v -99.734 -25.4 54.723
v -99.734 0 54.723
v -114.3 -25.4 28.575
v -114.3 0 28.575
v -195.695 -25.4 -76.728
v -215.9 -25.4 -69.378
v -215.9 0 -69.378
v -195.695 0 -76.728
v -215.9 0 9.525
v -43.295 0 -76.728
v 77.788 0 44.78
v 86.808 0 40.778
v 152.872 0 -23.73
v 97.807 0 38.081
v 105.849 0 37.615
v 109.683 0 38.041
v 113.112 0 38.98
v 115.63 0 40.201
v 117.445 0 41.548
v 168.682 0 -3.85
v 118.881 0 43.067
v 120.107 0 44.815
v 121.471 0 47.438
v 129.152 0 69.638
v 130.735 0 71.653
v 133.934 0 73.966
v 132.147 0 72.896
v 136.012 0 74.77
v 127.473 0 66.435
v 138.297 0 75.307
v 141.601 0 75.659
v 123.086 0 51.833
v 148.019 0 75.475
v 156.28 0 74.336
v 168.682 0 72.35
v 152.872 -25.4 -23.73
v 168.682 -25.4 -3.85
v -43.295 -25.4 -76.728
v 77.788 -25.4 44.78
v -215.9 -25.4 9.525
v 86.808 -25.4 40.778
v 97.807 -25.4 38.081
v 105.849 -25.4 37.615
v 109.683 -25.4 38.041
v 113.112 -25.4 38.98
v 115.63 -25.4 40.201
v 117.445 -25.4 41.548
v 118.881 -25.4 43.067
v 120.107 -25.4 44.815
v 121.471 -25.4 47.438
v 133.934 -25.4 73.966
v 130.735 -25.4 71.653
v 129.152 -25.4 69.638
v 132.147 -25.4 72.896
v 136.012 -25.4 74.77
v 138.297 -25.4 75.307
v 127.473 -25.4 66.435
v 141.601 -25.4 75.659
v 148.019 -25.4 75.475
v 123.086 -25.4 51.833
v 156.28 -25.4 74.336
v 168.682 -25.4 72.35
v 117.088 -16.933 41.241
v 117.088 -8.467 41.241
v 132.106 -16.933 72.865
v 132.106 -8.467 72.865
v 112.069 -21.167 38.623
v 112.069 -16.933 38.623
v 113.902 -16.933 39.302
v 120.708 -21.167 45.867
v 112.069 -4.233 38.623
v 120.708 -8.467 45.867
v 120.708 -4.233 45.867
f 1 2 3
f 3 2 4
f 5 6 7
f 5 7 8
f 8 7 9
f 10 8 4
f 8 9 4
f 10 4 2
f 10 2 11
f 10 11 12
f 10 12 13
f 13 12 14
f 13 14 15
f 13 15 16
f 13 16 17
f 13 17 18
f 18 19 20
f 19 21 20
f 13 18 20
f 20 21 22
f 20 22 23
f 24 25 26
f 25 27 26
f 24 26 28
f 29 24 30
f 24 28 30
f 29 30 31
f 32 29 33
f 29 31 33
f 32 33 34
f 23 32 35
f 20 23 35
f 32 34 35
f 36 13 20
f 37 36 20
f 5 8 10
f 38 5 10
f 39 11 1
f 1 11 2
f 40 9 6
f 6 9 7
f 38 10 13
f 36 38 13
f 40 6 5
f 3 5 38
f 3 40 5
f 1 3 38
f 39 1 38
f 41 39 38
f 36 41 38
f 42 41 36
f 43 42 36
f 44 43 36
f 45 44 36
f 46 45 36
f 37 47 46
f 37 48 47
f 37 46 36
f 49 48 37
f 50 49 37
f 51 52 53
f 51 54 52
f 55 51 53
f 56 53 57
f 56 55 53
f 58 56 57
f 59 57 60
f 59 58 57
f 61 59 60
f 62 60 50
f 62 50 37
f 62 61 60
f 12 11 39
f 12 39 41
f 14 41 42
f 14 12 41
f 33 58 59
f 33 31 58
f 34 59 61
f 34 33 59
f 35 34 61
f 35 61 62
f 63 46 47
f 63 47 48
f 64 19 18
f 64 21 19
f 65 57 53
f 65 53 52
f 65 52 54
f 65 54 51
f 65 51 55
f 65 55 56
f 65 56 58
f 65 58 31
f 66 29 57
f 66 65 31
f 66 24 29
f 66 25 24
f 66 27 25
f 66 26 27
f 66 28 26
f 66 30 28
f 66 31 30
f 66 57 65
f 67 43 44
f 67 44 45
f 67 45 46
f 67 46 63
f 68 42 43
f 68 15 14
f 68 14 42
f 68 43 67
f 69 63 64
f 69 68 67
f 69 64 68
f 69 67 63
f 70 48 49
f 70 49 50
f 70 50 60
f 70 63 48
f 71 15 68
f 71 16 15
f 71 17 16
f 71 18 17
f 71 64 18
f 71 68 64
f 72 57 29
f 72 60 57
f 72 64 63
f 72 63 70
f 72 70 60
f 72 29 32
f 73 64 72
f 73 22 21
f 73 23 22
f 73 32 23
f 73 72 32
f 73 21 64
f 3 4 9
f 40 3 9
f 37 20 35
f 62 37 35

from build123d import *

# Parameters (mm, degrees)
F1_DEPTH = 25.4


with BuildPart() as f1:
    # F0 (on Front) → F1 (new body)
    with BuildSketch(Plane.XZ):
        with BuildLine():
            Line((-99.7336241621, 54.722678585), (-114.3, 28.575))
            Line((-114.3, 28.575), (-215.9, 9.525))
            Line((-215.9, 9.525), (-215.9, -69.3783164024))
            Line((-215.9, -69.3783164024), (-195.6951445265, -76.7280469468))
            Line((-195.6951445265, -76.7280469468), (-43.2951445265, -76.7280469468))
            Line((-43.2951445265, -76.7280469468), (152.8718245721, -23.7303089322))
            Line((152.8718245721, -23.7303089322), (168.681639242, -3.8504256301))
            Line((168.681639242, -3.8504256301), (168.681639242, 72.3495743699))
            add(Edge.make_bspline(
                [(77.7881536934, 44.7799230815), (87.5052503852, 39.1232319061), (127.5069692973, 28.7633708953), (121.8249925186, 85.3969261899), (159.9719213388, 72.9549145345), (168.681639242, 72.3495743699)],
                knots=[0, 0, 0, 0, 0.3442648382, 0.6685351867, 1, 1, 1, 1], degree=3))
            Line((77.7881536934, 44.7799230815), (-99.7336241621, 54.722678585))
        make_face()
    extrude(amount=F1_DEPTH)


solid = f1.part
